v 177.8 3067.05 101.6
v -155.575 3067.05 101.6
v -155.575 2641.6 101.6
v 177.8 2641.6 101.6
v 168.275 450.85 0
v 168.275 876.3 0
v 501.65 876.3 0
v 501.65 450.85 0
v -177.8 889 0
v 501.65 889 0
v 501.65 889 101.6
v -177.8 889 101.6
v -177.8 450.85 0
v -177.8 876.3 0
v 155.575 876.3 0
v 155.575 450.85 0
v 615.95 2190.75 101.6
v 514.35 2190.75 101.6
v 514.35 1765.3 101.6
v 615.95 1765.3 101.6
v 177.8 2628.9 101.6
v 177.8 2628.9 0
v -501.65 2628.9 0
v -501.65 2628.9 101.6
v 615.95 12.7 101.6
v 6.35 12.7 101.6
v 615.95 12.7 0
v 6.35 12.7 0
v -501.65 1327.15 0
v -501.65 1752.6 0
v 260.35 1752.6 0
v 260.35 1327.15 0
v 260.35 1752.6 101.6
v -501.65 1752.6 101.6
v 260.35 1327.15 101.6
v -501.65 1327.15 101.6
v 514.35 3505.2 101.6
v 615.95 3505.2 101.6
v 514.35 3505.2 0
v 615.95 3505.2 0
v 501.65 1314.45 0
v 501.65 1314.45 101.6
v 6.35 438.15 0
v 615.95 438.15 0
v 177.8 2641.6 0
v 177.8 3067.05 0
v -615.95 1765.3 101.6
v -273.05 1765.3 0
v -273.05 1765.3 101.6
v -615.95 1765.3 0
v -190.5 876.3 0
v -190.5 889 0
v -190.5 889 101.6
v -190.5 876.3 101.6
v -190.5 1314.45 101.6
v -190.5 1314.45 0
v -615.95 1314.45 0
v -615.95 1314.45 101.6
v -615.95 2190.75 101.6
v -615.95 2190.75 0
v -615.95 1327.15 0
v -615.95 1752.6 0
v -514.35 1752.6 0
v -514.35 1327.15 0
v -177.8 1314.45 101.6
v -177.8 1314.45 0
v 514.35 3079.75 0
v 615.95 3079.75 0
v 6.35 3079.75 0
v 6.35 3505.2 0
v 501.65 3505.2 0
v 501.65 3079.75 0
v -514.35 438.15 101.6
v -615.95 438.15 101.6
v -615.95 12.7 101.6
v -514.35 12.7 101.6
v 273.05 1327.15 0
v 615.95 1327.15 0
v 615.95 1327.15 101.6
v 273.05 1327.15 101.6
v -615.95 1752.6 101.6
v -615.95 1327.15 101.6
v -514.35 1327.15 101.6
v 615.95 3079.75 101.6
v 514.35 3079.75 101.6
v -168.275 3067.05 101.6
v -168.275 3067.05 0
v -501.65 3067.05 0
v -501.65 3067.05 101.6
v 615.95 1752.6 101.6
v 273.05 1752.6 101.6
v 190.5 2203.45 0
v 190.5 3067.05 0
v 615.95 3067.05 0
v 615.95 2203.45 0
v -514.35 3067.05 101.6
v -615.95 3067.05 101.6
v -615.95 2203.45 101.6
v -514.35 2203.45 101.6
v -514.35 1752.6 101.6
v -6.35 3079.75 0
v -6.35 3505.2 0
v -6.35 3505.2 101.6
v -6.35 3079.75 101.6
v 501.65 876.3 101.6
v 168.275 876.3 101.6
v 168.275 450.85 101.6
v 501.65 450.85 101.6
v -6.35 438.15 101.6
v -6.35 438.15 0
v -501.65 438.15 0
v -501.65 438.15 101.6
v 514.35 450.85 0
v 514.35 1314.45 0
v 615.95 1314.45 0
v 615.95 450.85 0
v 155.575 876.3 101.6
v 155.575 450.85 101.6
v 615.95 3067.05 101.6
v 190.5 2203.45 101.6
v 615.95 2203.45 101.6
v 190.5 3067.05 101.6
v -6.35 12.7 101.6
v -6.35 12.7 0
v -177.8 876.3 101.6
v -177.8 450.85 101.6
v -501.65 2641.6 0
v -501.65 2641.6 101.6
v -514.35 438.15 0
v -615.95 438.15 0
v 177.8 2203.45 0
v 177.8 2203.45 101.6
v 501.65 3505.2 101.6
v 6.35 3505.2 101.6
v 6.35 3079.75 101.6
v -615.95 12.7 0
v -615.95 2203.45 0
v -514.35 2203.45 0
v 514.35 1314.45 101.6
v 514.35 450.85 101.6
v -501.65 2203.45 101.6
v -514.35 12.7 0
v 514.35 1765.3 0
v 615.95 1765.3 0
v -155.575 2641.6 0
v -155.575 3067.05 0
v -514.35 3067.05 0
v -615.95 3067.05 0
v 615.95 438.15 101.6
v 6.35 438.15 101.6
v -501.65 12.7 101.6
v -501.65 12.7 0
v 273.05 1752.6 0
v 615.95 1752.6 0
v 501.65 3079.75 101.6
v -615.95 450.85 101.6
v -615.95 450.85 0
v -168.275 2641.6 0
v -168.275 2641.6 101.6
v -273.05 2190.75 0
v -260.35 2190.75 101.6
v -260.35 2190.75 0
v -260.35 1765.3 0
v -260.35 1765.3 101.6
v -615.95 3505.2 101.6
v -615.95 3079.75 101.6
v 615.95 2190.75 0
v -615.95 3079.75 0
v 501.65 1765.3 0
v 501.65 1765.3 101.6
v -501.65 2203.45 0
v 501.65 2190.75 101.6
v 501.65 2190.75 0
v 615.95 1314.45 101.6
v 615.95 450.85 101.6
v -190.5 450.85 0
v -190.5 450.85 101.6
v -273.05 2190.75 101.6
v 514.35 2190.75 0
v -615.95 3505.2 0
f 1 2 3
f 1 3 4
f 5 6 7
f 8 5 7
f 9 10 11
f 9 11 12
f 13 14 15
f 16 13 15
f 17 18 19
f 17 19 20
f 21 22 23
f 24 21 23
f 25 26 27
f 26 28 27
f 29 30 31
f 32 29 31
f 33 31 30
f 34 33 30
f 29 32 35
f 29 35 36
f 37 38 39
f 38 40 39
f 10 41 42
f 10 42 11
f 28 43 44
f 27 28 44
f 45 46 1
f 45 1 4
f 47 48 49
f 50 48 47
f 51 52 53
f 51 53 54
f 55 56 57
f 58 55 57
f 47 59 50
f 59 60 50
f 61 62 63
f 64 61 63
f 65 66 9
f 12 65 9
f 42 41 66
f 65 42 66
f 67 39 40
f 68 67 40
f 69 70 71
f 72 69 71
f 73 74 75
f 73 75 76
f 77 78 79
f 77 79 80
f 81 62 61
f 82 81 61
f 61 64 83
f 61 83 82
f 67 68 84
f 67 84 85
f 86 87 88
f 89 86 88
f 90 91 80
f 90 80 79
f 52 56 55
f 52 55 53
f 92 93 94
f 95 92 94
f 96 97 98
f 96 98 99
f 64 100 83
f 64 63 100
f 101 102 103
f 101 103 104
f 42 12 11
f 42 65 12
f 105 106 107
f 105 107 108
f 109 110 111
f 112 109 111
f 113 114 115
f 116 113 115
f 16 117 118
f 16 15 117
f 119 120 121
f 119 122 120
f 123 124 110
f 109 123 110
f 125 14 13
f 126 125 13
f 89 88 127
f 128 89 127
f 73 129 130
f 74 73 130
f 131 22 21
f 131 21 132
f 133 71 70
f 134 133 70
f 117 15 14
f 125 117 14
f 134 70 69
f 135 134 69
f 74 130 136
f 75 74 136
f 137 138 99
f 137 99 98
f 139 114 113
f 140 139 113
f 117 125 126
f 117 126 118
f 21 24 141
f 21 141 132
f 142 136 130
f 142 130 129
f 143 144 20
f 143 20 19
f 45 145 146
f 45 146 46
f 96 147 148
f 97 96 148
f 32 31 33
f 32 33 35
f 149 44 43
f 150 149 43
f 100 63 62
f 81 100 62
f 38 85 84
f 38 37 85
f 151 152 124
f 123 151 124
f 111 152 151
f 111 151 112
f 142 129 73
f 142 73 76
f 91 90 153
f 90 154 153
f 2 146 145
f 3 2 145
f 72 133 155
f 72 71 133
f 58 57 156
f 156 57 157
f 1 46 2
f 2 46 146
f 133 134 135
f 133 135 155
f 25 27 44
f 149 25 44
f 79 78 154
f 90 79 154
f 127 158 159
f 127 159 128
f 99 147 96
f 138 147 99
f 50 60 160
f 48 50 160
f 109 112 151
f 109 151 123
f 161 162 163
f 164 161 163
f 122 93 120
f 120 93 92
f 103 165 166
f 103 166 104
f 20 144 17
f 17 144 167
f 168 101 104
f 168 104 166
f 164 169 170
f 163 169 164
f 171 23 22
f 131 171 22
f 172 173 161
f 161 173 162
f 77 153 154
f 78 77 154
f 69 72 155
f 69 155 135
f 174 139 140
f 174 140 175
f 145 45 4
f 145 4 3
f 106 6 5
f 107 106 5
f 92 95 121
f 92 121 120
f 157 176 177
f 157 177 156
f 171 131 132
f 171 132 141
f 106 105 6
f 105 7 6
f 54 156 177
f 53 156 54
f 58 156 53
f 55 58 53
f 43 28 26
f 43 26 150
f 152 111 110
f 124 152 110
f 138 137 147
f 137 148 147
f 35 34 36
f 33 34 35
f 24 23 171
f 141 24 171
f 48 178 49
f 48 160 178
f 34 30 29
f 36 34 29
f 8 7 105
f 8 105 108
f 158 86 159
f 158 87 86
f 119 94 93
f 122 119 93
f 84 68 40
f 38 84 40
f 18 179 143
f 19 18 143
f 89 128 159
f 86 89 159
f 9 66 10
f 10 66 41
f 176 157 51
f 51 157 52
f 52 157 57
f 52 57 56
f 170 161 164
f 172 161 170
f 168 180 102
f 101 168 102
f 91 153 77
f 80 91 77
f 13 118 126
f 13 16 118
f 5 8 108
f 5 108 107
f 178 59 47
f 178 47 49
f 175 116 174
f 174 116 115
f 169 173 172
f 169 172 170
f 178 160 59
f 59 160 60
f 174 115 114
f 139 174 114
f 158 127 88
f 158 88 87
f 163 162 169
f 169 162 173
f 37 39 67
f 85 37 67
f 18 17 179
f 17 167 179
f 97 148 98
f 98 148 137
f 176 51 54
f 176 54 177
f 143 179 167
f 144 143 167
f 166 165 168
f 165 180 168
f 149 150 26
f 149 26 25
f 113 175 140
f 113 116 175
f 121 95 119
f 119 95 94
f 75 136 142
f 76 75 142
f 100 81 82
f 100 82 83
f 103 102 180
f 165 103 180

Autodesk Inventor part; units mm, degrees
ref_plane "YZ Plane" through (0, 0, 0) normal (1, 0, 0) x (0, 1, 0)
ref_plane "XZ Plane" through (0, 0, 0) normal (0, 1, 0) x (-1, 0, 0)
ref_plane "XY Plane" through (0, 0, 0) normal (0, 0, 1) x (1, 0, 0)
sketch "Sketch1" plane through (0, 0, 0) normal (0, 0, 1) x (1, 0, 0)
  line L0 (-615.95, 0) -> (615.95, 0)
  line L1 (615.95, 0) -> (615.95, 3517.9)
  line L2 (615.95, 3517.9) -> (-615.95, 3517.9)
  line L3 (-615.95, 3517.9) -> (-615.95, 0)
  line L4 (615.95, 3079.75) -> (-615.95, 3079.75)
  line L5 (615.95, 3067.05) -> (-615.95, 3067.05)
  line L6 (177.8, 2641.6) -> (-501.65, 2641.6)
  line L7 (177.8, 2628.9) -> (-501.65, 2628.9)
  line L8 (615.95, 2203.45) -> (-615.95, 2203.45)
  line L9 (615.95, 2190.75) -> (-615.95, 2190.75)
  line L10 (615.95, 1765.3) -> (-615.95, 1765.3)
  line L11 (615.95, 1752.6) -> (-615.95, 1752.6)
  line L12 (615.95, 1327.15) -> (-615.95, 1327.15)
  line L13 (615.95, 1314.45) -> (-615.95, 1314.45)
  line L14 (501.65, 889) -> (-190.5, 889)
  line L15 (501.65, 876.3) -> (-190.5, 876.3)
  line L16 (615.95, 450.85) -> (-615.95, 450.85)
  line L17 (615.95, 438.15) -> (-615.95, 438.15)
  line L18 (615.95, 3505.2) -> (-615.95, 3505.2)
  line L19 (-615.95, 12.7) -> (615.95, 12.7)
  line L20 (514.35, 1314.45) -> (514.35, 450.85)
  line L21 (514.35, 2190.75) -> (514.35, 1765.3)
  line L22 (-514.35, 1752.6) -> (-514.35, 1327.15)
  line L23 (501.65, 2190.75) -> (501.65, 1765.3)
  line L24 (-501.65, 1752.6) -> (-501.65, 1327.15)
  line L25 (501.65, 1314.45) -> (501.65, 450.85)
  line L26 (-190.5, 1314.45) -> (-190.5, 450.85)
  line L27 (-177.8, 1314.45) -> (-177.8, 450.85)
  line L28 (190.5, 3067.05) -> (190.5, 2203.45)
  line L29 (177.8, 3067.05) -> (177.8, 2203.45)
  line L30 (514.35, 3505.2) -> (514.35, 3079.75)
  line L31 (501.65, 3505.2) -> (501.65, 3079.75)
  line L32 (-514.35, 3067.05) -> (-514.35, 2203.45)
  line L33 (-501.65, 3067.05) -> (-501.65, 2203.45)
  line L34 (-514.35, 438.15) -> (-514.35, 12.7)
  line L35 (-501.65, 12.7) -> (-501.65, 438.15)
  line L36 (-6.35, 12.7) -> (-6.35, 438.15)
  line L37 (6.35, 12.7) -> (6.35, 438.15)
  line L38 (6.35, 3505.2) -> (6.35, 3079.75)
  line L39 (-6.35, 3505.2) -> (-6.35, 3079.75)
  line L40 (155.575, 876.3) -> (155.575, 450.85)
  line L41 (168.275, 876.3) -> (168.275, 450.85)
  line L42 (-155.575, 3067.05) -> (-155.575, 2641.6)
  line L43 (-168.275, 3067.05) -> (-168.275, 2641.6)
  line L44 (260.35, 1752.6) -> (260.35, 1327.15)
  line L45 (273.05, 1752.6) -> (273.05, 1327.15)
  line L46 (-260.35, 2190.75) -> (-260.35, 1765.3)
  line L47 (-273.05, 2190.75) -> (-273.05, 1765.3)
  point P0 (0, 0)
  point P1 (0, 0)
  point P2 (-177.8, 889)
  point P3 (-177.8, 876.3)
  point P4 (-177.8, 450.85)
  dimension "d0" = 3517.9
  dimension "d1" = 1231.9
  dimension "d3" = 12.7
  dimension "d4" = 425.45
  dimension "d5" = 12.7
  dimension "d6" = 425.45
  dimension "d7" = 12.7
  dimension "d8" = 425.45
  dimension "d9" = 12.7
  dimension "d10" = 425.45
  dimension "d11" = 12.7
  dimension "d12" = 425.45
  dimension "d13" = 12.7
  dimension "d14" = 425.45
  dimension "d15" = 12.7
  dimension "d16" = 12.7
  dimension "d17" = 425.45
  dimension "d18" = 12.7
  dimension "d20" = 101.6
  dimension "d21" = 101.6
  dimension "d22" = 101.6
  dimension "d25" = 425.45
  dimension "d26" = 12.7
  dimension "d27" = 12.7
  dimension "d28" = 12.7
  dimension "d30" = 425.45
  dimension "d31" = 12.7
  dimension "d32" = 425.45
  dimension "d34" = 12.7
  dimension "d35" = 101.6
  dimension "d36" = 12.7
  dimension "d37" = 101.6
  dimension "d38" = 12.7
  dimension "d39" = 101.6
  dimension "d40" = 12.7
  dimension "d46" = 609.6
  dimension "d47" = 495.3
  dimension "d48" = 495.3
  dimension "d49" = 609.6
  dimension "d50" = 333.375
  dimension "d51" = 12.7
  dimension "d52" = 333.375
  dimension "d53" = 12.7
  dimension "d55" = 762
  dimension "d56" = 12.7
  dimension "d57" = 762
  dimension "d58" = 12.7
extrude "Extrusion1" add sketch "Sketch1" along normal blind 101.6 contours L3 L18 L39 L4
extrude "Extrusion2" add sketch "Sketch1" along normal blind 101.6 separate body contours L38 L18 L31 L4
extrude "Extrusion3" add sketch "Sketch1" along normal blind 101.6 separate body contours L5 L43 L6 L33
extrude "Extrusion4" add sketch "Sketch1" along normal blind 101.6 separate body contours L29 L6 L42 L5
extrude "Extrusion5" add sketch "Sketch1" along normal blind 101.6 separate body contours L8 L28 L5 L1
extrude "Extrusion6" add sketch "Sketch1" along normal blind 101.6 separate body contours L33 L7 L29 L8
extrude "Extrusion7" add sketch "Sketch1" along normal blind 101.6 separate body contours L3 L9 L47 L10
extrude "Extrusion8" add sketch "Sketch1" along normal blind 101.6 separate body contours L46 L9 L23 L10
extrude "Extrusion9" add sketch "Sketch1" along normal blind 101.6 separate body contours L3 L13 L26 L16
extrude "Extrusion10" add sketch "Sketch1" along normal blind 101.6 separate body contours L13 L25 L14 L27
extrude "Extrusion11" add sketch "Sketch1" along normal blind 101.6 separate body contours L27 L15 L40 L16
extrude "Extrusion12" add sketch "Sketch1" along normal blind 101.6 separate body contours L16 L41 L15 L25
extrude "Extrusion13" add sketch "Sketch1" along normal blind 101.6 separate body contours L4 L30 L18 L1
extrude "Extrusion14" add sketch "Sketch1" along normal blind 101.6 separate body contours L3 L5 L32 L8
extrude "Extrusion15" add sketch "Sketch1" along normal blind 101.6 separate body contours L10 L21 L9 L1
extrude "Extrusion16" add sketch "Sketch1" along normal blind 101.6 separate body contours L3 L11 L22 L12
extrude "Extrusion17" add sketch "Sketch1" along normal blind 101.6 separate body contours L24 L11 L44 L12
extrude "Extrusion18" add sketch "Sketch1" along normal blind 101.6 separate body contours L12 L45 L11 L1
extrude "Extrusion19" add sketch "Sketch1" along normal blind 101.6 separate body contours L16 L20 L13 L1
extrude "Extrusion20" add sketch "Sketch1" along normal blind 101.6 separate body contours L3 L17 L34 L19
extrude "Extrusion21" add sketch "Sketch1" along normal blind 101.6 separate body contours L35 L17 L36 L19
extrude "Extrusion22" add sketch "Sketch1" along normal blind 101.6 separate body contours L19 L37 L17 L1
equation "\"d3\" = Joint"
equation "\"d4\" = Course"
equation "\"d5\" = Joint"
equation "\"d6\" = Course"
equation "\"d7\" = Joint"
equation "\"d8\" = Course"
equation "\"d9\" = Joint"
equation "\"d10\" = Course"
equation "\"d11\" = Joint"
equation "\"d12\" = Course"
equation "\"d13\" = Joint"
equation "\"d14\" = Course"
equation "\"d15\" = Joint"
equation "\"d17\" = Course"
equation "\"d18\" = Joint"
equation "\"d20\" = d19"
equation "\"d21\" = d19"
equation "\"d22\" = Thick"
equation "\"d26\" = Joint"
equation "\"d27\" = Joint"
equation "\"d28\" = Joint"
equation "\"d30\" = Course"
equation "\"d31\" = Joint"
equation "\"d32\" = Course"
equation "\"d34\" = Joint"
equation "\"d35\" = Thick"
equation "\"d36\" = Joint"
equation "\"d37\" = Thick"
equation "\"d38\" = Joint"
equation "\"d39\" = Thick"
equation "\"d40\" = Joint"
equation "\"d19\" = Thick"
equation "\"Thick\" = 101.6"
equation "\"Joint\" = 12.7"
equation "\"Course\" = 425.45"
properties part number "C - Split face veneer" material "Granite, Cut, Polished"
